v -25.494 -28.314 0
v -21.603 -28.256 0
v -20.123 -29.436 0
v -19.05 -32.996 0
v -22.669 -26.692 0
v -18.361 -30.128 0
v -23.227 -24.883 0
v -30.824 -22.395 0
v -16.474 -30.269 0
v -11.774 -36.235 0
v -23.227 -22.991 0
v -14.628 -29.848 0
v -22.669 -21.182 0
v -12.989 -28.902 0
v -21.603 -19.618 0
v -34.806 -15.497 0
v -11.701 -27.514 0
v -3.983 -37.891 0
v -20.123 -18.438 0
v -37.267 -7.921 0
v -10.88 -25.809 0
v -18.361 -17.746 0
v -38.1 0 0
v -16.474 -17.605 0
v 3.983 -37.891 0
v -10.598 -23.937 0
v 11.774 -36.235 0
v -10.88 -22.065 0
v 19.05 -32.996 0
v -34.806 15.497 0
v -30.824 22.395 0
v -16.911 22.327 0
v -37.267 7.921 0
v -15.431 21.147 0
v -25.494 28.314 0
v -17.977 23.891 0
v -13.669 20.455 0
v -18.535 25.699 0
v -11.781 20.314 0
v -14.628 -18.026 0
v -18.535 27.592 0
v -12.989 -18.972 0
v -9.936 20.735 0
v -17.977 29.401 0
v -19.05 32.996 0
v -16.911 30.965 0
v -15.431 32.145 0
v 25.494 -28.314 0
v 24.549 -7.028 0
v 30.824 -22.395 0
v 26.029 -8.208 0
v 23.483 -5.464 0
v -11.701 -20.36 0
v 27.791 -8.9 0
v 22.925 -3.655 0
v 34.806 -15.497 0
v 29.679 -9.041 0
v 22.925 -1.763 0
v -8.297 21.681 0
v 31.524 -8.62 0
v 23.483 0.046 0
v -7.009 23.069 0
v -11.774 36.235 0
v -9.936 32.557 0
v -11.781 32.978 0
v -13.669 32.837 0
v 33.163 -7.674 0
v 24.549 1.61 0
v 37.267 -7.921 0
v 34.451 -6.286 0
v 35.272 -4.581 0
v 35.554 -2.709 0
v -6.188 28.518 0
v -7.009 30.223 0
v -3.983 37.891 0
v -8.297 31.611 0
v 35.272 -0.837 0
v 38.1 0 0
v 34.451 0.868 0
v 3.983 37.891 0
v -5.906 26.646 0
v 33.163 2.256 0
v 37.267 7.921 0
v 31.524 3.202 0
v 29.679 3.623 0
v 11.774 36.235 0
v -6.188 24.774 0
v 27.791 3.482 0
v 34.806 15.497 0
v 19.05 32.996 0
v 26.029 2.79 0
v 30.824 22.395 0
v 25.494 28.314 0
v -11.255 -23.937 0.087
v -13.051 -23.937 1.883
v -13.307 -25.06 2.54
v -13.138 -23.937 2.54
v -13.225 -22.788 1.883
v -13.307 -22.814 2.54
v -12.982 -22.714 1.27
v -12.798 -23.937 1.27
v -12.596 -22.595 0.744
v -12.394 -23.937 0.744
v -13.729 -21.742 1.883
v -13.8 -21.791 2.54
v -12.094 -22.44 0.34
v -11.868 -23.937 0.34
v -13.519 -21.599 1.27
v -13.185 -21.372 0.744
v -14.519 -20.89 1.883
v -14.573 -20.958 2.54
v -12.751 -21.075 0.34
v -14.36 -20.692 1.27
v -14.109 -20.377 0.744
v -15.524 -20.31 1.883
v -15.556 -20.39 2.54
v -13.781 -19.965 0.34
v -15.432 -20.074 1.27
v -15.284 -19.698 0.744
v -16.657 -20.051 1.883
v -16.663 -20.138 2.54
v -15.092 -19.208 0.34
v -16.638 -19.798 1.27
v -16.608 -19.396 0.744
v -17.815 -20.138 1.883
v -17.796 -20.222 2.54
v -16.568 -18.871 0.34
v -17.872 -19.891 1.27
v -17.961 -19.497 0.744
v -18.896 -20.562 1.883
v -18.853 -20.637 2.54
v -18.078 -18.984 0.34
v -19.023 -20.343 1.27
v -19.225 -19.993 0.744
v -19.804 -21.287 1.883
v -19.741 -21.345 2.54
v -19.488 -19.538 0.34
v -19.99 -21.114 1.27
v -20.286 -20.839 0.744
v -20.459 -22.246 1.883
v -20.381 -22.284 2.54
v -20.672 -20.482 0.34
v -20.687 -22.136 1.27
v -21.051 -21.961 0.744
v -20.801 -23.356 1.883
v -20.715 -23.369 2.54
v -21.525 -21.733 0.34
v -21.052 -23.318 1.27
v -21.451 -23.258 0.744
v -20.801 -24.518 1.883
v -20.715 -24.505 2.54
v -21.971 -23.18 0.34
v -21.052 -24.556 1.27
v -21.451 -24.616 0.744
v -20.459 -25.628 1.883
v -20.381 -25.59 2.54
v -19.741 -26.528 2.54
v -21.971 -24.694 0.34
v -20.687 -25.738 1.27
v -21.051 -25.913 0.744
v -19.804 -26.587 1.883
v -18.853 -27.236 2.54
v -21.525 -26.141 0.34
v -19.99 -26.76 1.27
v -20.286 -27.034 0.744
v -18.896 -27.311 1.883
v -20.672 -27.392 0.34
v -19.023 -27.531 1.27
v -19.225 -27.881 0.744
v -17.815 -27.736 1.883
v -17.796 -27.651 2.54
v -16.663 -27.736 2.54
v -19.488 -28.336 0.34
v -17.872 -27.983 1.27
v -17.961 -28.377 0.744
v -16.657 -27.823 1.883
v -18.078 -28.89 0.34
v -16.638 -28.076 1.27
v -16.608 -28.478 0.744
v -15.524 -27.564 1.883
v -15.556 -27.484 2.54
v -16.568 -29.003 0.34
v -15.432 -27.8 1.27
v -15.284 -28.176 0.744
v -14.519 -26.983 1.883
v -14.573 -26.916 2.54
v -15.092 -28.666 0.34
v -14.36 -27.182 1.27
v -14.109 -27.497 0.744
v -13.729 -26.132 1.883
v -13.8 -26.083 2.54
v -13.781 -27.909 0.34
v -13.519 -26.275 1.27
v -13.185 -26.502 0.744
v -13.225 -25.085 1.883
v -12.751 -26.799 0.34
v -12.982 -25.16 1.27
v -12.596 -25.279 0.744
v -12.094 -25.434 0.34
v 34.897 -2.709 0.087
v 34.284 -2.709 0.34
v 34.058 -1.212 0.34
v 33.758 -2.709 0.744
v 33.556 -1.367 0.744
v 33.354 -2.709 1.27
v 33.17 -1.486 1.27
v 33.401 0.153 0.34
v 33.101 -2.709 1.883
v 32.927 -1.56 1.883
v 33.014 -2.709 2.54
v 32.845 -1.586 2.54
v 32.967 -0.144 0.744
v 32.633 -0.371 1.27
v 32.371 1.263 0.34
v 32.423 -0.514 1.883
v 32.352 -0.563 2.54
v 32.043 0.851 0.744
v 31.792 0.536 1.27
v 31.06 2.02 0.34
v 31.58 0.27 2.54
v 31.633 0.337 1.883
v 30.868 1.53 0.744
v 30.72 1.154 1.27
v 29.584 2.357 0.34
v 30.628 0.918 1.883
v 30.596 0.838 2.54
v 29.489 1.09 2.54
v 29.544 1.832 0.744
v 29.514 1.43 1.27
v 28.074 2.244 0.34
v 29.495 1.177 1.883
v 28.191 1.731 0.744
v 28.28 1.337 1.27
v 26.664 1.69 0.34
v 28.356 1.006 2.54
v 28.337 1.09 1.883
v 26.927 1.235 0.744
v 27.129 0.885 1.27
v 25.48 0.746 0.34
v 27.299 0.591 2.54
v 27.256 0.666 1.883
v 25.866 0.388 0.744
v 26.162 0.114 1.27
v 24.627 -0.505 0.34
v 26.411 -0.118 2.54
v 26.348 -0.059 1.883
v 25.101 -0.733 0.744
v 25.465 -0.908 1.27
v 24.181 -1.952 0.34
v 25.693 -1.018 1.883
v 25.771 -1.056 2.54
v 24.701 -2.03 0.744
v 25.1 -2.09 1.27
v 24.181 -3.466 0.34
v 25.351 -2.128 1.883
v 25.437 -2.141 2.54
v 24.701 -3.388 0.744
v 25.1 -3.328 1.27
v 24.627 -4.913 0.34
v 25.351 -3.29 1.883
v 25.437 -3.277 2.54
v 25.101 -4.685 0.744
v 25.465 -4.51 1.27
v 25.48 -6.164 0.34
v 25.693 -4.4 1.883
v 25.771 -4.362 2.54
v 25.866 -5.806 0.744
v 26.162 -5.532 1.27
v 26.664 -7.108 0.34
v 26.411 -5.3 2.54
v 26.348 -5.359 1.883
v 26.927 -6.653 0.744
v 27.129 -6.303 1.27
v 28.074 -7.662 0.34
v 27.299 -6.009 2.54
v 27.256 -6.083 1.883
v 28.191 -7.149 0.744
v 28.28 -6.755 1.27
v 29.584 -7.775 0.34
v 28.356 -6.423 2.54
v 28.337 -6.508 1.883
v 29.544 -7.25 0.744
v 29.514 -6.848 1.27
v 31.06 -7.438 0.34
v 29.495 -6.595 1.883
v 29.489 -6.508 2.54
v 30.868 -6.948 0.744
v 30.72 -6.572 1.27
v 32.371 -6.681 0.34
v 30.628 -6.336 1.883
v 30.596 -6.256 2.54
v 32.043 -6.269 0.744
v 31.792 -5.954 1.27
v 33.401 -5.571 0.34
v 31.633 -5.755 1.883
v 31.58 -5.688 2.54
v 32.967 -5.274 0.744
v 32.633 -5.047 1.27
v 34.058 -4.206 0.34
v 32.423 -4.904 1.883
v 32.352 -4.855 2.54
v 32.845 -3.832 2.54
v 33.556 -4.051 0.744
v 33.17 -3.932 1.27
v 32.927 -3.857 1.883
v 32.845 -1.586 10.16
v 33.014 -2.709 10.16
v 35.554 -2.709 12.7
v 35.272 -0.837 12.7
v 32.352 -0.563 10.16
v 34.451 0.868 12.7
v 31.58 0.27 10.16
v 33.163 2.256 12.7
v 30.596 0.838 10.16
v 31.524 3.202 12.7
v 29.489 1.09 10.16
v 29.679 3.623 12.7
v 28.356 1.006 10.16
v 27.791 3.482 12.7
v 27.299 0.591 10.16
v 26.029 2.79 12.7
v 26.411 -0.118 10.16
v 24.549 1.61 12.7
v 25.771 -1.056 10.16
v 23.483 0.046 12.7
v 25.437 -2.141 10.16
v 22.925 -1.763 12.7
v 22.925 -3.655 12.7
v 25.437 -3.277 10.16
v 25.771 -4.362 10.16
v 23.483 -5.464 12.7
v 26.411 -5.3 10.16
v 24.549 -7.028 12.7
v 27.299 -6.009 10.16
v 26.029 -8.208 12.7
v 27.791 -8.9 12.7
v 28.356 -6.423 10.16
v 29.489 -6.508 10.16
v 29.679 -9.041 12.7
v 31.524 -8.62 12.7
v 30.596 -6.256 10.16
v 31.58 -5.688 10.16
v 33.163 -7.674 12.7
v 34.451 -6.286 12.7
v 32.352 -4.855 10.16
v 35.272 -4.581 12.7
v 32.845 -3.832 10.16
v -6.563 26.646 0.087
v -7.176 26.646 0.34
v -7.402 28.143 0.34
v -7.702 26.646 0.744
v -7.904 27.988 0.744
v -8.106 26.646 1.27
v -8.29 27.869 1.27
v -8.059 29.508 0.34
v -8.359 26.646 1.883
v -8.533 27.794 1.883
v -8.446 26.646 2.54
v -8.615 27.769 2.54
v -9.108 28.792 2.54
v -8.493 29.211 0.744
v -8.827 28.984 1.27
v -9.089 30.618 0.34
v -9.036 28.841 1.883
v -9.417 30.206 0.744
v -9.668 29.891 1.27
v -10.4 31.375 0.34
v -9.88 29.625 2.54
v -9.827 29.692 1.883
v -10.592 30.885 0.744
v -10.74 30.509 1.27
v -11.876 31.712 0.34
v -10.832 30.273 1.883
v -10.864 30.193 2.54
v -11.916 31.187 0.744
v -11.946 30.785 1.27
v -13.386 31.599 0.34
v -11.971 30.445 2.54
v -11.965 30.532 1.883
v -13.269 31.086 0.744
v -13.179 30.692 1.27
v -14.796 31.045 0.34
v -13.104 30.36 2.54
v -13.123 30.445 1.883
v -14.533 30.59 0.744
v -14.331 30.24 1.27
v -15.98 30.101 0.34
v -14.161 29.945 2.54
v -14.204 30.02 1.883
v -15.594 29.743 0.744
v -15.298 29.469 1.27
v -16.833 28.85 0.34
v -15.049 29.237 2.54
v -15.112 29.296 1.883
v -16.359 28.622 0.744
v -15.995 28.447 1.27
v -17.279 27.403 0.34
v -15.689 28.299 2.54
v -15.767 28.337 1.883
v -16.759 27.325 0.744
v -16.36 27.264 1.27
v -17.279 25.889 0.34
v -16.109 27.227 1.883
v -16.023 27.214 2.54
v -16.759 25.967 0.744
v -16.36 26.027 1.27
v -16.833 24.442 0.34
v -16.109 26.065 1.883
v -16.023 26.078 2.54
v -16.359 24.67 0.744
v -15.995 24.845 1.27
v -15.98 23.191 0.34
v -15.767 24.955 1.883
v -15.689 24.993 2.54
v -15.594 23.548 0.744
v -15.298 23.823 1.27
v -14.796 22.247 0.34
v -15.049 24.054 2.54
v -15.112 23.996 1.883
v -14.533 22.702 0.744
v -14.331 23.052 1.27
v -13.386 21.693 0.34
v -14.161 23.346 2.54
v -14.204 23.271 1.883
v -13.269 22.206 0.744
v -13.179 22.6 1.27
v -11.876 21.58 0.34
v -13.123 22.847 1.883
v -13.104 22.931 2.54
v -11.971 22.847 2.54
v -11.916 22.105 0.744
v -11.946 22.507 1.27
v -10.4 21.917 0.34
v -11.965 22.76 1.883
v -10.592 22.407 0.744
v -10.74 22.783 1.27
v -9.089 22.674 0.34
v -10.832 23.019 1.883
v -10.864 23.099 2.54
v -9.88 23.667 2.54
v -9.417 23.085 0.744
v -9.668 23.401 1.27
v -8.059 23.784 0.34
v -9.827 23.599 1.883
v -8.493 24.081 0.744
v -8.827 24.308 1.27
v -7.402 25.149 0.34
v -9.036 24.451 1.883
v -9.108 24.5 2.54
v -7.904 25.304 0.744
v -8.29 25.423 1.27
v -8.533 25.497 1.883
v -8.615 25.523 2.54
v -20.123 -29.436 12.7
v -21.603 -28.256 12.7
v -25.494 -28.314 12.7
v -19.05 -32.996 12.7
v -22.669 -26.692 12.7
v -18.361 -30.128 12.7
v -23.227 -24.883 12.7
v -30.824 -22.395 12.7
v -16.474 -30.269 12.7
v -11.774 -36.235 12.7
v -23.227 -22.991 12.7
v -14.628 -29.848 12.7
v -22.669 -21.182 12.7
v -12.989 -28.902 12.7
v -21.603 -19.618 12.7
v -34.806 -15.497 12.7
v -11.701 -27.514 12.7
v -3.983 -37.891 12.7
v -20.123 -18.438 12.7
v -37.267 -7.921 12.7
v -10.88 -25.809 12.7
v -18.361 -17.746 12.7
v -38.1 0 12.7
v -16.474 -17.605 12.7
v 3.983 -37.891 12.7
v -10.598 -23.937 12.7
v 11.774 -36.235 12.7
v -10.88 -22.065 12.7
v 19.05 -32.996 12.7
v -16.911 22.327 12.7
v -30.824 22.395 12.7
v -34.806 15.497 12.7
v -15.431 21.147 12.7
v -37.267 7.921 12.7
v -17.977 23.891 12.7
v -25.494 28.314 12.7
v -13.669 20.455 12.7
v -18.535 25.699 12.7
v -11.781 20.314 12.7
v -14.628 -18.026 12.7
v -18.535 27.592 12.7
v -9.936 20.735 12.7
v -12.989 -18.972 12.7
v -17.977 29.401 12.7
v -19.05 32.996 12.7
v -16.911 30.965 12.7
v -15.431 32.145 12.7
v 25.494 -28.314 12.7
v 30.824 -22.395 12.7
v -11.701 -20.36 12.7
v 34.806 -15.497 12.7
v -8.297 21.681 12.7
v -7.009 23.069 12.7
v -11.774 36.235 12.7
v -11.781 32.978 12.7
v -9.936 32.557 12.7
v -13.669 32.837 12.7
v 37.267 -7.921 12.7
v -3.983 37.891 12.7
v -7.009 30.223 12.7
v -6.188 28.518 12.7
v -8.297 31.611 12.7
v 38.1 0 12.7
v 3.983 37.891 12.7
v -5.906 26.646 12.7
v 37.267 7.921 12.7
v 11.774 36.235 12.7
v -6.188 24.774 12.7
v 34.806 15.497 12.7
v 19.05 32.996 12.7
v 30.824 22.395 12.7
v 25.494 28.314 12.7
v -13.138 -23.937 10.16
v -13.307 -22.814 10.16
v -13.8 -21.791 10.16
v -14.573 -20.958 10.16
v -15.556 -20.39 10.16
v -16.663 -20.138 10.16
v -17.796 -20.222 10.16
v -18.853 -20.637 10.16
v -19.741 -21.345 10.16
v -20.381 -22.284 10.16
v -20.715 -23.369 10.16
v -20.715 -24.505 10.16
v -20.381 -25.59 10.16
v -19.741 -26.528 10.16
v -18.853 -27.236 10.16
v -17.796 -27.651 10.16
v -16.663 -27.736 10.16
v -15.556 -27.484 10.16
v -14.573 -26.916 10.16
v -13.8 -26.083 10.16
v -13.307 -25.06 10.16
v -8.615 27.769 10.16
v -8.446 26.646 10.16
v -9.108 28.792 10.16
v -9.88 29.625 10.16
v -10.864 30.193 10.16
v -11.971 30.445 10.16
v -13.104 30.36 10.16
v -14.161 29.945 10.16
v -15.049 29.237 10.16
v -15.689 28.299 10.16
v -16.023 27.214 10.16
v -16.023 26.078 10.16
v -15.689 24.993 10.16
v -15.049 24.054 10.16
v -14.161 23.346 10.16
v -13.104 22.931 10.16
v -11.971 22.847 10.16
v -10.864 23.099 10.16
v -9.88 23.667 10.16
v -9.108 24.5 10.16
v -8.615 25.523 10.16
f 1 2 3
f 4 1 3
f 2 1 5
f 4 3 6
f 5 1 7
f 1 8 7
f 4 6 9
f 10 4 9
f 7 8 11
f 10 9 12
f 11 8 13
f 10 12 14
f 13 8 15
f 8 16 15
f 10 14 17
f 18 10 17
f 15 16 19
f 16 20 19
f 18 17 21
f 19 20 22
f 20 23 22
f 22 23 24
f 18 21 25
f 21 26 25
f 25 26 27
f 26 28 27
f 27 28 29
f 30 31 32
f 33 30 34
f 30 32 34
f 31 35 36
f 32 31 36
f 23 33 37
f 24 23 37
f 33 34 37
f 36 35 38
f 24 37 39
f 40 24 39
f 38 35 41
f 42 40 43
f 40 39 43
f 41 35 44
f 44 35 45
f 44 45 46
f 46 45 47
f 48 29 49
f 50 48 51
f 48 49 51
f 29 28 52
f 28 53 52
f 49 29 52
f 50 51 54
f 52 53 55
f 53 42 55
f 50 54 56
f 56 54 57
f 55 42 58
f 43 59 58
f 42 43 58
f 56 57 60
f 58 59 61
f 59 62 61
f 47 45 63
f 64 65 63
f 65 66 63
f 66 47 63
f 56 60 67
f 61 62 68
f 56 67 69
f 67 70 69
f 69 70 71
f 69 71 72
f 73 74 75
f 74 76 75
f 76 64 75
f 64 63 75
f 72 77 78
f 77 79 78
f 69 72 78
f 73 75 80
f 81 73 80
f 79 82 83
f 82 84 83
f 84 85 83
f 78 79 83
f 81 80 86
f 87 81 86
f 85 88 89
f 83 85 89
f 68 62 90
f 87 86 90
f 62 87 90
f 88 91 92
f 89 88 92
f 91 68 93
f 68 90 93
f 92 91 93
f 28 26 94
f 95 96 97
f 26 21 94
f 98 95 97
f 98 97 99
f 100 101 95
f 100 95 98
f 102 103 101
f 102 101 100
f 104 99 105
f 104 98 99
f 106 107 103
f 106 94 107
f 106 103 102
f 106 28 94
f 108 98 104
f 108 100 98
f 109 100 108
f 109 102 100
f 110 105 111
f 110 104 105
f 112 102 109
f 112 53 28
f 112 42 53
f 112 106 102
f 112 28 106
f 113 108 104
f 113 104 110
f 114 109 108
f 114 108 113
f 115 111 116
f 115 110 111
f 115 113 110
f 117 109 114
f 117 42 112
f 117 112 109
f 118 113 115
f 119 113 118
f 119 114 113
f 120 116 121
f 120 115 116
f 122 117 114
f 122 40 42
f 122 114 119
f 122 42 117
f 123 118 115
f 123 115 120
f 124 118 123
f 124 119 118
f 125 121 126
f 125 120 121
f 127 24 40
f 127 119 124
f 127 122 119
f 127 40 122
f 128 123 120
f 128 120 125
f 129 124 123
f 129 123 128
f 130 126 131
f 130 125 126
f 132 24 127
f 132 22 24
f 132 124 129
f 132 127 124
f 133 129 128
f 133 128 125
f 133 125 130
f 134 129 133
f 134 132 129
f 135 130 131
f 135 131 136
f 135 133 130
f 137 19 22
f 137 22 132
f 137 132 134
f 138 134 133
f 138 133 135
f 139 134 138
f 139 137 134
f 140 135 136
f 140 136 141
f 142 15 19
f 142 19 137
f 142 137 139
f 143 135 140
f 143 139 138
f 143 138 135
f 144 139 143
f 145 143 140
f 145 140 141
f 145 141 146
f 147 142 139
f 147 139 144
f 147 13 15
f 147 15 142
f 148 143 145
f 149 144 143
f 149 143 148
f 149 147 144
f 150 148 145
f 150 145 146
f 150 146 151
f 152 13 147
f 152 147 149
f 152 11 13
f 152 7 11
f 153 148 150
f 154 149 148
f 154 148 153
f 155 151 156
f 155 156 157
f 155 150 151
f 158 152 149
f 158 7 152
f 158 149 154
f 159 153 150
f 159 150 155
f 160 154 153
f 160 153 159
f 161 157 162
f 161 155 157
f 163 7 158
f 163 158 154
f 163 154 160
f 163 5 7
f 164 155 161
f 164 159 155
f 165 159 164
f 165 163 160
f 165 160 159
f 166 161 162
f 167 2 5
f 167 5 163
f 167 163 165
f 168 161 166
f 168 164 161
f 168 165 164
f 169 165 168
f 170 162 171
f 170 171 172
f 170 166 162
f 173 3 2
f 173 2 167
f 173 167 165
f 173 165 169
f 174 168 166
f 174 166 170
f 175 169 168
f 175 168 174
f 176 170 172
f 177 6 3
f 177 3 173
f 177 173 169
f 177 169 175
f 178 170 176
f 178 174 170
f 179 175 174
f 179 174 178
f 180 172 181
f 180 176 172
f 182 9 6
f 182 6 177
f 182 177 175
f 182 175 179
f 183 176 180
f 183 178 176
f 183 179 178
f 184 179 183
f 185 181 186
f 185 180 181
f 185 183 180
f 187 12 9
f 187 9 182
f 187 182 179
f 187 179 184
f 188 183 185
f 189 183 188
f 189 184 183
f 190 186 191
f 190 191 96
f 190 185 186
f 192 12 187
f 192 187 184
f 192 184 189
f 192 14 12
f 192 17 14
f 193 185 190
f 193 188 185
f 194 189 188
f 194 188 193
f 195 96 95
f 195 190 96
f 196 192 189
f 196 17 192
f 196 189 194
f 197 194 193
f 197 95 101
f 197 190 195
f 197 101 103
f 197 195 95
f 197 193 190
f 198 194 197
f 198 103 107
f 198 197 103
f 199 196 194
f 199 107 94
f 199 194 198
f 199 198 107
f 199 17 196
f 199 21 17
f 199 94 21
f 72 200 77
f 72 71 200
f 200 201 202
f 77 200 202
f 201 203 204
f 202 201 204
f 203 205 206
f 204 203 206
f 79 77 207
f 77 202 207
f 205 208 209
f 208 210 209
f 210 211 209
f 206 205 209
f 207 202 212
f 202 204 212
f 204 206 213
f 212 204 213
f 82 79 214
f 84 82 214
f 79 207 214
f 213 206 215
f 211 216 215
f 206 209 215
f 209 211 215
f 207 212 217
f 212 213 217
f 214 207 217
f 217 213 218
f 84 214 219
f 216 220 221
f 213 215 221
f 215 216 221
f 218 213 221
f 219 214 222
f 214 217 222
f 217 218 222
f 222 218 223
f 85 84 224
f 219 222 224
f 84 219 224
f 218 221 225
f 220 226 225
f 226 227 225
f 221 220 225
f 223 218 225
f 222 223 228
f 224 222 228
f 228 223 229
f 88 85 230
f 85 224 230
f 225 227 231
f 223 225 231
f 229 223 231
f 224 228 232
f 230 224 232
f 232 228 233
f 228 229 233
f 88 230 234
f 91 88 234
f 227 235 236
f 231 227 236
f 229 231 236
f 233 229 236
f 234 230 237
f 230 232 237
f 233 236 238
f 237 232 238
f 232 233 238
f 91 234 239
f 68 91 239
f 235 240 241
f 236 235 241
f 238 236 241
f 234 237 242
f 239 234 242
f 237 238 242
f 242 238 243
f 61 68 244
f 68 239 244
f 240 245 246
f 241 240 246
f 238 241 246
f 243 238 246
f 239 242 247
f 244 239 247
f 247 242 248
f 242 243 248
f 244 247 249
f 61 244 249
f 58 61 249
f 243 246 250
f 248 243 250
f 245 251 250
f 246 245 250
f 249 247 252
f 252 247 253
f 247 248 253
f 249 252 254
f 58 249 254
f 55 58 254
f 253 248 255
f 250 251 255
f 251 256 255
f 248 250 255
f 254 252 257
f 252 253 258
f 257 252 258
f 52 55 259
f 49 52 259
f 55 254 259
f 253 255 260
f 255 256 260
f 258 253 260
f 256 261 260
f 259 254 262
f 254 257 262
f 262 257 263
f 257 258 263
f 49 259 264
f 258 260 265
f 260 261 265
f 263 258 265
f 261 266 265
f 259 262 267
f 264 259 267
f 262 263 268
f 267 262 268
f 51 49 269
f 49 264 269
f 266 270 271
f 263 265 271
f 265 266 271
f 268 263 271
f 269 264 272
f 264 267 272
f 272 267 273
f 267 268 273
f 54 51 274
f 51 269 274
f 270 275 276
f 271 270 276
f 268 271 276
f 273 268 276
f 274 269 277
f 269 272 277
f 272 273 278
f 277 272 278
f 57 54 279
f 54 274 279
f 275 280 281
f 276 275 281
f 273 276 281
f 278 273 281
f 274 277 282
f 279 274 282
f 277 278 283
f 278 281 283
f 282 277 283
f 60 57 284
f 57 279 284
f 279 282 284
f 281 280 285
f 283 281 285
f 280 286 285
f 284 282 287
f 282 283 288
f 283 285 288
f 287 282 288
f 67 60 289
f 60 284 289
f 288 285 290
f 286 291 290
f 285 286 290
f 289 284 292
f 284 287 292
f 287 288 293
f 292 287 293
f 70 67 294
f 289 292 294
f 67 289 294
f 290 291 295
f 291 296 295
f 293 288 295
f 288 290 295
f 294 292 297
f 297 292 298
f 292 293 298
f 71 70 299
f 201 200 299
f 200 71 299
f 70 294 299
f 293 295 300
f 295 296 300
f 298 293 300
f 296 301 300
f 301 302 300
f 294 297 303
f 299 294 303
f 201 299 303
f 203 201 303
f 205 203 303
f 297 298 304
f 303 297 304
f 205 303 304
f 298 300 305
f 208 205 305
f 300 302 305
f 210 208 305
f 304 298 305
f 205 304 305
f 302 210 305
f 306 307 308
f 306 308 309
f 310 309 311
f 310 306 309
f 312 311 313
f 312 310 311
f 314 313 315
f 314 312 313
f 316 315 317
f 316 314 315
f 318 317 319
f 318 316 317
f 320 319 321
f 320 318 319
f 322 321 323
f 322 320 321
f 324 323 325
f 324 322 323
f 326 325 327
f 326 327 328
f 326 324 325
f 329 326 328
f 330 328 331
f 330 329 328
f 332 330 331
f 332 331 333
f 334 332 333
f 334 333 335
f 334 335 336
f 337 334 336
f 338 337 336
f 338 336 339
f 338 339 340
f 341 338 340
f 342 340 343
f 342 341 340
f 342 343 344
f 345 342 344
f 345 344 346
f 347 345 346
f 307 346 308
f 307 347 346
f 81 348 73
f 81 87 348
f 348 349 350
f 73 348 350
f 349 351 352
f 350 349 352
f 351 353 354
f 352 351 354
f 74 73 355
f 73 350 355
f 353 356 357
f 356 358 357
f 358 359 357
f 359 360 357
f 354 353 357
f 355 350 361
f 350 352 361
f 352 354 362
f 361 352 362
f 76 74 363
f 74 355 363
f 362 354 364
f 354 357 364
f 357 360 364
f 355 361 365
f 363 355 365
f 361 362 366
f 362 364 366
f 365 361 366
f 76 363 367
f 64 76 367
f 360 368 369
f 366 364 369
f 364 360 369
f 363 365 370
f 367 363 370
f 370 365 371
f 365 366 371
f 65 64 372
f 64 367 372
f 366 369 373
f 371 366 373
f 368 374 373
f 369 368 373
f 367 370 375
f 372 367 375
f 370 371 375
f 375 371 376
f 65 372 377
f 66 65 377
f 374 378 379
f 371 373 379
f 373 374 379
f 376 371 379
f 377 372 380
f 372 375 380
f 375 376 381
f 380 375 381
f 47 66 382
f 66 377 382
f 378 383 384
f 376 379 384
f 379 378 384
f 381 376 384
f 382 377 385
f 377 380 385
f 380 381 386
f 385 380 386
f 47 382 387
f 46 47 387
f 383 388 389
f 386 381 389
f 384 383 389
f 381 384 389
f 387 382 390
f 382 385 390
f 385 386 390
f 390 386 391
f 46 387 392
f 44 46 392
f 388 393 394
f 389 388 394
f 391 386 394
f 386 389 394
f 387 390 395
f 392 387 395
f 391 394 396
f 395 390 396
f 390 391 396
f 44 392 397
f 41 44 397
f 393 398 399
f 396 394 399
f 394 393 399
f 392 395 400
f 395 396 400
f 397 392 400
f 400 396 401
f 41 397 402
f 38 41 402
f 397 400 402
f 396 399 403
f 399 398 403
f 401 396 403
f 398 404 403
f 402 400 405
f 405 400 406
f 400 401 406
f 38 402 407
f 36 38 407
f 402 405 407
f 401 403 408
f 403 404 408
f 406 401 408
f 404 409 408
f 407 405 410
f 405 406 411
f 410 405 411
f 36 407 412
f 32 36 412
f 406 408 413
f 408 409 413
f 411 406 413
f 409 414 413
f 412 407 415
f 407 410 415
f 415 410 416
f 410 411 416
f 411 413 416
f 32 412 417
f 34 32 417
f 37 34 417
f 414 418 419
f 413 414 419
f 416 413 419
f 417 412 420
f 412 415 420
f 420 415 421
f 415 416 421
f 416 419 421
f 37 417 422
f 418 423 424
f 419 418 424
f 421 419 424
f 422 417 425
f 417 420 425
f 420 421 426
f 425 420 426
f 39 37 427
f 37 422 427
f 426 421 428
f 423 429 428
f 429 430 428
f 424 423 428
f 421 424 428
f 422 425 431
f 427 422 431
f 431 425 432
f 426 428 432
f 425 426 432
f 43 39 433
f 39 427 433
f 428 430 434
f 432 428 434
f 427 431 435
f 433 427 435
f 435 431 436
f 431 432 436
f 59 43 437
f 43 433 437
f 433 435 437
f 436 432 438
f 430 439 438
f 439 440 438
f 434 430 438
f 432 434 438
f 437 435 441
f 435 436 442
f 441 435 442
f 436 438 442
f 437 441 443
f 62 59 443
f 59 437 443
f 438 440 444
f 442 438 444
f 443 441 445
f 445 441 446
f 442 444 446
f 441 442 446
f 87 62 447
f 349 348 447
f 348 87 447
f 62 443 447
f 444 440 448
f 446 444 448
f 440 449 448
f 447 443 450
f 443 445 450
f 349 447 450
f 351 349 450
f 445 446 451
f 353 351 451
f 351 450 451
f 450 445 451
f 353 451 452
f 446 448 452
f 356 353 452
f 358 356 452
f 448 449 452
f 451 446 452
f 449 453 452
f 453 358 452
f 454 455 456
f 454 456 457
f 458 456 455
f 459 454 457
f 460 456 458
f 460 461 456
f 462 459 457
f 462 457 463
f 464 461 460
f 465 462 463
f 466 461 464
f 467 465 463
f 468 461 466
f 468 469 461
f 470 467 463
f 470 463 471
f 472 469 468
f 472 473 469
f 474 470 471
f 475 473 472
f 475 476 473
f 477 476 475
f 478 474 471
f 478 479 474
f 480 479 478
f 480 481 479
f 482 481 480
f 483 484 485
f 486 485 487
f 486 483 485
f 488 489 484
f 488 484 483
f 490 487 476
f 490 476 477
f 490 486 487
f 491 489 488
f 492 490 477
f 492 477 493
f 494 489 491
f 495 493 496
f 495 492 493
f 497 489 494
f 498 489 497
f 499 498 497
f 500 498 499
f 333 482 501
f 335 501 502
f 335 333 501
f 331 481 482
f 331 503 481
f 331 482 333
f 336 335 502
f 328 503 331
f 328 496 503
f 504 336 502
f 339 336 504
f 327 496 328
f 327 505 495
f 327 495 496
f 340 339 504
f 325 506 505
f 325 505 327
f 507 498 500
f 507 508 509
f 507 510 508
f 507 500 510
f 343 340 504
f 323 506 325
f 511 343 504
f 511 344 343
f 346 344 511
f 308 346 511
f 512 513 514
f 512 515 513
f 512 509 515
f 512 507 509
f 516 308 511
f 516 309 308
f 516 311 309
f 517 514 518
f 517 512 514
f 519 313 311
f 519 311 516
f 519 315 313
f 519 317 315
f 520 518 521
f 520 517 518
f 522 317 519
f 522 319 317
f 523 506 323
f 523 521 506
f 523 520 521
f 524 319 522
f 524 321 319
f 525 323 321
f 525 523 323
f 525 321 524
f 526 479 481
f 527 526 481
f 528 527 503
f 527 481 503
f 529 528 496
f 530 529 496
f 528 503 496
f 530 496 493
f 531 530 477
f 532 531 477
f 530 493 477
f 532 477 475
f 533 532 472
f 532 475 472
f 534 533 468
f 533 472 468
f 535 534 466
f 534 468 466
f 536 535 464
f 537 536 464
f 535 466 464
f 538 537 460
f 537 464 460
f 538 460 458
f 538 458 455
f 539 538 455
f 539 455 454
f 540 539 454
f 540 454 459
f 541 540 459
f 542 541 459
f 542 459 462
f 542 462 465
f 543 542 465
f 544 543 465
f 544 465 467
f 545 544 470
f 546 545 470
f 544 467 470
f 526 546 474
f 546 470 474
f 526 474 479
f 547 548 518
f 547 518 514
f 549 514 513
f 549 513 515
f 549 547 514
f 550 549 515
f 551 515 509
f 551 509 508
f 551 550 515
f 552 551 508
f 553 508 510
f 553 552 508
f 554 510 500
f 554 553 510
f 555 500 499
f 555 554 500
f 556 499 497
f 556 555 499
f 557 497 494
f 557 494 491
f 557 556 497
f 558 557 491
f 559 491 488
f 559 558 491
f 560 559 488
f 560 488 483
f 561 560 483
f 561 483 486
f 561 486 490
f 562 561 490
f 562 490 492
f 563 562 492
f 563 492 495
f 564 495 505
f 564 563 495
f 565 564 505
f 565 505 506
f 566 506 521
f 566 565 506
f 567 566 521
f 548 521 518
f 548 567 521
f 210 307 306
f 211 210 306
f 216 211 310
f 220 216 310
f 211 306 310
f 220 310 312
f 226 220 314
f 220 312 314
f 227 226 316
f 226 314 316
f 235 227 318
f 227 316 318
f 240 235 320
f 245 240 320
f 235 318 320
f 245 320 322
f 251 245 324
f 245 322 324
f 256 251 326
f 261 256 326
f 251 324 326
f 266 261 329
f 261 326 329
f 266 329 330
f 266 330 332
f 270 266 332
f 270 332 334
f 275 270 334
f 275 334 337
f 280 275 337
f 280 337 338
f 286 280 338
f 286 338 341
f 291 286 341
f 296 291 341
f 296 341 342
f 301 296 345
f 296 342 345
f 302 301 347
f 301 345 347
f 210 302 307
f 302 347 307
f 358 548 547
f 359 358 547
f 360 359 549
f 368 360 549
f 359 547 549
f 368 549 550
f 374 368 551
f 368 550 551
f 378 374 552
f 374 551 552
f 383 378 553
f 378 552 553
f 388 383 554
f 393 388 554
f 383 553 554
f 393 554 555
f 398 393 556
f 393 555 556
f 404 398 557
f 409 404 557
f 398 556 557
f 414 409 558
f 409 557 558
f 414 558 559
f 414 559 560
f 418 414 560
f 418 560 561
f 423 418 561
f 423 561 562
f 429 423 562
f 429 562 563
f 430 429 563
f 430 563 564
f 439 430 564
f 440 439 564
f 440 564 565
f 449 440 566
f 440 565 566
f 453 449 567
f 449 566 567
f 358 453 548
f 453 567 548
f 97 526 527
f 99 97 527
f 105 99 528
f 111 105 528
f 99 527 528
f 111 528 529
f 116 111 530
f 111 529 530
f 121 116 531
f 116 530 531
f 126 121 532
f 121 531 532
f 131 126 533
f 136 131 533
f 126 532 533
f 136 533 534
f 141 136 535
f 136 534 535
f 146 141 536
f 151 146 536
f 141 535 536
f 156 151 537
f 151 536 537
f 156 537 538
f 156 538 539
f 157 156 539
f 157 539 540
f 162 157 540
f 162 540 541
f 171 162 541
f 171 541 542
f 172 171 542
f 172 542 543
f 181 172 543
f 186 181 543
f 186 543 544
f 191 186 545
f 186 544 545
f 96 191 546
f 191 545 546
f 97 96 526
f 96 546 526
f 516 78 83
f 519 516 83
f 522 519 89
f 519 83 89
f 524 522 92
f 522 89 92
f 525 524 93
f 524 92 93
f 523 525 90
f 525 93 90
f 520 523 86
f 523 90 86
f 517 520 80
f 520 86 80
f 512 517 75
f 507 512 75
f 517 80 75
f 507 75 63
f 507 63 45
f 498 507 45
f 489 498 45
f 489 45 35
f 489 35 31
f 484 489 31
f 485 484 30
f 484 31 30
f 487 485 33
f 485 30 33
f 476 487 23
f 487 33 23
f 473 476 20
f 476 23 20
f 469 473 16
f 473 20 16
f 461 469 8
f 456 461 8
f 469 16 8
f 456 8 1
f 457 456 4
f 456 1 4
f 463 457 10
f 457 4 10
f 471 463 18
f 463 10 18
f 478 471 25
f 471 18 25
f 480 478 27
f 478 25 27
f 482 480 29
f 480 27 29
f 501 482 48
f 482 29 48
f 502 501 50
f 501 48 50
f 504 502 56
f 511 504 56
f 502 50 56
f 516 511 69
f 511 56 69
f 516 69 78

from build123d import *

# Parameters (mm, degrees)
F0_R     = 38.1
F0_R_2   = 6.35
F1_DEPTH = 12.7
F2_R     = 6.35
F2_R_2   = 3.810001
F2_R_3   = 3.81
F3_DEPTH = 12.7
F4_R     = 2.54
F5_SIZE  = 2.54


with BuildPart() as f1:
    # F0 (on Top) → F1 (new body)
    with BuildSketch(Plane.XY):
        Circle(F0_R)
        with Locations((-16.948049, -23.936937)):
            Circle(F0_R_2, mode=Mode.SUBTRACT)
        with Locations((29.20402, -2.708972)):
            Circle(F0_R_2, mode=Mode.SUBTRACT)
        with Locations((-12.255971, 26.64591)):
            Circle(F0_R_2, mode=Mode.SUBTRACT)
    extrude(amount=F1_DEPTH)

    # F2 (on face) → F3 (join)
    with BuildSketch(Plane.XY.offset(12.7)):
        with Locations((-16.948049, -23.936937)):
            Circle(F2_R)
        with Locations((-16.948049, -23.936937)):
            Circle(F2_R_2, mode=Mode.SUBTRACT)
        with Locations((-12.255971, 26.64591)):
            Circle(F2_R)
        with Locations((-12.255971, 26.64591)):
            Circle(F2_R_3, mode=Mode.SUBTRACT)
        with Locations((29.20402, -2.708972)):
            Circle(F2_R)
        with Locations((29.20402, -2.708972)):
            Circle(F2_R_3, mode=Mode.SUBTRACT)
    extrude(amount=-F3_DEPTH)

    # F4
    f4_edges = [f1.edges().sort_by_distance(p)[0] for p in [
        (25.39402, -2.708972, 0),
        (-16.065971, 26.64591, 0),
        (-20.75805, -23.936937, 0),
    ]]
    fillet(f4_edges, radius=F4_R)

    # F5
    f5_edges = [f1.edges().sort_by_distance(p)[0] for p in [
        (-16.065971, 26.64591, 12.7),
        (25.39402, -2.708972, 12.7),
        (-20.75805, -23.936937, 12.7),
    ]]
    chamfer(f5_edges, length=F5_SIZE)


solid = f1.part
